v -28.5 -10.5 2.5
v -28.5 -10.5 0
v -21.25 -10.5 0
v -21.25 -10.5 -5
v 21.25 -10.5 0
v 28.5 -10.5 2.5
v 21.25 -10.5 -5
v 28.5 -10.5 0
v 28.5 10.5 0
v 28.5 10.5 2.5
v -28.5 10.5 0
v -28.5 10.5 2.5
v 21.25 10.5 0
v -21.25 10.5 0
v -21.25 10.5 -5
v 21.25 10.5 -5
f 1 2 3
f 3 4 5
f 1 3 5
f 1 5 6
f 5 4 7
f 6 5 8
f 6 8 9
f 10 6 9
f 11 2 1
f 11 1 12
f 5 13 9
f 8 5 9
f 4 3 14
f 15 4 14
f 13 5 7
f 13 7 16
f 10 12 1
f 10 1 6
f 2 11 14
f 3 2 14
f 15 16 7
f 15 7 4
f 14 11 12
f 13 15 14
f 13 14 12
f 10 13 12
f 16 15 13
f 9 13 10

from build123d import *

# Parameters (mm, degrees)
SKETCH1_W           = 57
SKETCH1_H           = 21
BOSS_EXTRUDE1_DEPTH = 2.5
SKETCH2_W           = 42.5
SKETCH2_H           = 21
BOSS_EXTRUDE2_DEPTH = 5


with BuildPart() as part:
    # Sketch1 → Boss-Extrude1 (new body)
    with BuildSketch(Plane.XY):
        Rectangle(SKETCH1_W, SKETCH1_H)
    extrude(amount=BOSS_EXTRUDE1_DEPTH)

    # Sketch2 → Boss-Extrude2 (add)
    with BuildSketch(Plane(origin=(0, 0, 0), x_dir=(-1, 0, 0), z_dir=(0, 0, -1))):
        Rectangle(SKETCH2_W, SKETCH2_H)
    extrude(amount=BOSS_EXTRUDE2_DEPTH)


solid = part.part
